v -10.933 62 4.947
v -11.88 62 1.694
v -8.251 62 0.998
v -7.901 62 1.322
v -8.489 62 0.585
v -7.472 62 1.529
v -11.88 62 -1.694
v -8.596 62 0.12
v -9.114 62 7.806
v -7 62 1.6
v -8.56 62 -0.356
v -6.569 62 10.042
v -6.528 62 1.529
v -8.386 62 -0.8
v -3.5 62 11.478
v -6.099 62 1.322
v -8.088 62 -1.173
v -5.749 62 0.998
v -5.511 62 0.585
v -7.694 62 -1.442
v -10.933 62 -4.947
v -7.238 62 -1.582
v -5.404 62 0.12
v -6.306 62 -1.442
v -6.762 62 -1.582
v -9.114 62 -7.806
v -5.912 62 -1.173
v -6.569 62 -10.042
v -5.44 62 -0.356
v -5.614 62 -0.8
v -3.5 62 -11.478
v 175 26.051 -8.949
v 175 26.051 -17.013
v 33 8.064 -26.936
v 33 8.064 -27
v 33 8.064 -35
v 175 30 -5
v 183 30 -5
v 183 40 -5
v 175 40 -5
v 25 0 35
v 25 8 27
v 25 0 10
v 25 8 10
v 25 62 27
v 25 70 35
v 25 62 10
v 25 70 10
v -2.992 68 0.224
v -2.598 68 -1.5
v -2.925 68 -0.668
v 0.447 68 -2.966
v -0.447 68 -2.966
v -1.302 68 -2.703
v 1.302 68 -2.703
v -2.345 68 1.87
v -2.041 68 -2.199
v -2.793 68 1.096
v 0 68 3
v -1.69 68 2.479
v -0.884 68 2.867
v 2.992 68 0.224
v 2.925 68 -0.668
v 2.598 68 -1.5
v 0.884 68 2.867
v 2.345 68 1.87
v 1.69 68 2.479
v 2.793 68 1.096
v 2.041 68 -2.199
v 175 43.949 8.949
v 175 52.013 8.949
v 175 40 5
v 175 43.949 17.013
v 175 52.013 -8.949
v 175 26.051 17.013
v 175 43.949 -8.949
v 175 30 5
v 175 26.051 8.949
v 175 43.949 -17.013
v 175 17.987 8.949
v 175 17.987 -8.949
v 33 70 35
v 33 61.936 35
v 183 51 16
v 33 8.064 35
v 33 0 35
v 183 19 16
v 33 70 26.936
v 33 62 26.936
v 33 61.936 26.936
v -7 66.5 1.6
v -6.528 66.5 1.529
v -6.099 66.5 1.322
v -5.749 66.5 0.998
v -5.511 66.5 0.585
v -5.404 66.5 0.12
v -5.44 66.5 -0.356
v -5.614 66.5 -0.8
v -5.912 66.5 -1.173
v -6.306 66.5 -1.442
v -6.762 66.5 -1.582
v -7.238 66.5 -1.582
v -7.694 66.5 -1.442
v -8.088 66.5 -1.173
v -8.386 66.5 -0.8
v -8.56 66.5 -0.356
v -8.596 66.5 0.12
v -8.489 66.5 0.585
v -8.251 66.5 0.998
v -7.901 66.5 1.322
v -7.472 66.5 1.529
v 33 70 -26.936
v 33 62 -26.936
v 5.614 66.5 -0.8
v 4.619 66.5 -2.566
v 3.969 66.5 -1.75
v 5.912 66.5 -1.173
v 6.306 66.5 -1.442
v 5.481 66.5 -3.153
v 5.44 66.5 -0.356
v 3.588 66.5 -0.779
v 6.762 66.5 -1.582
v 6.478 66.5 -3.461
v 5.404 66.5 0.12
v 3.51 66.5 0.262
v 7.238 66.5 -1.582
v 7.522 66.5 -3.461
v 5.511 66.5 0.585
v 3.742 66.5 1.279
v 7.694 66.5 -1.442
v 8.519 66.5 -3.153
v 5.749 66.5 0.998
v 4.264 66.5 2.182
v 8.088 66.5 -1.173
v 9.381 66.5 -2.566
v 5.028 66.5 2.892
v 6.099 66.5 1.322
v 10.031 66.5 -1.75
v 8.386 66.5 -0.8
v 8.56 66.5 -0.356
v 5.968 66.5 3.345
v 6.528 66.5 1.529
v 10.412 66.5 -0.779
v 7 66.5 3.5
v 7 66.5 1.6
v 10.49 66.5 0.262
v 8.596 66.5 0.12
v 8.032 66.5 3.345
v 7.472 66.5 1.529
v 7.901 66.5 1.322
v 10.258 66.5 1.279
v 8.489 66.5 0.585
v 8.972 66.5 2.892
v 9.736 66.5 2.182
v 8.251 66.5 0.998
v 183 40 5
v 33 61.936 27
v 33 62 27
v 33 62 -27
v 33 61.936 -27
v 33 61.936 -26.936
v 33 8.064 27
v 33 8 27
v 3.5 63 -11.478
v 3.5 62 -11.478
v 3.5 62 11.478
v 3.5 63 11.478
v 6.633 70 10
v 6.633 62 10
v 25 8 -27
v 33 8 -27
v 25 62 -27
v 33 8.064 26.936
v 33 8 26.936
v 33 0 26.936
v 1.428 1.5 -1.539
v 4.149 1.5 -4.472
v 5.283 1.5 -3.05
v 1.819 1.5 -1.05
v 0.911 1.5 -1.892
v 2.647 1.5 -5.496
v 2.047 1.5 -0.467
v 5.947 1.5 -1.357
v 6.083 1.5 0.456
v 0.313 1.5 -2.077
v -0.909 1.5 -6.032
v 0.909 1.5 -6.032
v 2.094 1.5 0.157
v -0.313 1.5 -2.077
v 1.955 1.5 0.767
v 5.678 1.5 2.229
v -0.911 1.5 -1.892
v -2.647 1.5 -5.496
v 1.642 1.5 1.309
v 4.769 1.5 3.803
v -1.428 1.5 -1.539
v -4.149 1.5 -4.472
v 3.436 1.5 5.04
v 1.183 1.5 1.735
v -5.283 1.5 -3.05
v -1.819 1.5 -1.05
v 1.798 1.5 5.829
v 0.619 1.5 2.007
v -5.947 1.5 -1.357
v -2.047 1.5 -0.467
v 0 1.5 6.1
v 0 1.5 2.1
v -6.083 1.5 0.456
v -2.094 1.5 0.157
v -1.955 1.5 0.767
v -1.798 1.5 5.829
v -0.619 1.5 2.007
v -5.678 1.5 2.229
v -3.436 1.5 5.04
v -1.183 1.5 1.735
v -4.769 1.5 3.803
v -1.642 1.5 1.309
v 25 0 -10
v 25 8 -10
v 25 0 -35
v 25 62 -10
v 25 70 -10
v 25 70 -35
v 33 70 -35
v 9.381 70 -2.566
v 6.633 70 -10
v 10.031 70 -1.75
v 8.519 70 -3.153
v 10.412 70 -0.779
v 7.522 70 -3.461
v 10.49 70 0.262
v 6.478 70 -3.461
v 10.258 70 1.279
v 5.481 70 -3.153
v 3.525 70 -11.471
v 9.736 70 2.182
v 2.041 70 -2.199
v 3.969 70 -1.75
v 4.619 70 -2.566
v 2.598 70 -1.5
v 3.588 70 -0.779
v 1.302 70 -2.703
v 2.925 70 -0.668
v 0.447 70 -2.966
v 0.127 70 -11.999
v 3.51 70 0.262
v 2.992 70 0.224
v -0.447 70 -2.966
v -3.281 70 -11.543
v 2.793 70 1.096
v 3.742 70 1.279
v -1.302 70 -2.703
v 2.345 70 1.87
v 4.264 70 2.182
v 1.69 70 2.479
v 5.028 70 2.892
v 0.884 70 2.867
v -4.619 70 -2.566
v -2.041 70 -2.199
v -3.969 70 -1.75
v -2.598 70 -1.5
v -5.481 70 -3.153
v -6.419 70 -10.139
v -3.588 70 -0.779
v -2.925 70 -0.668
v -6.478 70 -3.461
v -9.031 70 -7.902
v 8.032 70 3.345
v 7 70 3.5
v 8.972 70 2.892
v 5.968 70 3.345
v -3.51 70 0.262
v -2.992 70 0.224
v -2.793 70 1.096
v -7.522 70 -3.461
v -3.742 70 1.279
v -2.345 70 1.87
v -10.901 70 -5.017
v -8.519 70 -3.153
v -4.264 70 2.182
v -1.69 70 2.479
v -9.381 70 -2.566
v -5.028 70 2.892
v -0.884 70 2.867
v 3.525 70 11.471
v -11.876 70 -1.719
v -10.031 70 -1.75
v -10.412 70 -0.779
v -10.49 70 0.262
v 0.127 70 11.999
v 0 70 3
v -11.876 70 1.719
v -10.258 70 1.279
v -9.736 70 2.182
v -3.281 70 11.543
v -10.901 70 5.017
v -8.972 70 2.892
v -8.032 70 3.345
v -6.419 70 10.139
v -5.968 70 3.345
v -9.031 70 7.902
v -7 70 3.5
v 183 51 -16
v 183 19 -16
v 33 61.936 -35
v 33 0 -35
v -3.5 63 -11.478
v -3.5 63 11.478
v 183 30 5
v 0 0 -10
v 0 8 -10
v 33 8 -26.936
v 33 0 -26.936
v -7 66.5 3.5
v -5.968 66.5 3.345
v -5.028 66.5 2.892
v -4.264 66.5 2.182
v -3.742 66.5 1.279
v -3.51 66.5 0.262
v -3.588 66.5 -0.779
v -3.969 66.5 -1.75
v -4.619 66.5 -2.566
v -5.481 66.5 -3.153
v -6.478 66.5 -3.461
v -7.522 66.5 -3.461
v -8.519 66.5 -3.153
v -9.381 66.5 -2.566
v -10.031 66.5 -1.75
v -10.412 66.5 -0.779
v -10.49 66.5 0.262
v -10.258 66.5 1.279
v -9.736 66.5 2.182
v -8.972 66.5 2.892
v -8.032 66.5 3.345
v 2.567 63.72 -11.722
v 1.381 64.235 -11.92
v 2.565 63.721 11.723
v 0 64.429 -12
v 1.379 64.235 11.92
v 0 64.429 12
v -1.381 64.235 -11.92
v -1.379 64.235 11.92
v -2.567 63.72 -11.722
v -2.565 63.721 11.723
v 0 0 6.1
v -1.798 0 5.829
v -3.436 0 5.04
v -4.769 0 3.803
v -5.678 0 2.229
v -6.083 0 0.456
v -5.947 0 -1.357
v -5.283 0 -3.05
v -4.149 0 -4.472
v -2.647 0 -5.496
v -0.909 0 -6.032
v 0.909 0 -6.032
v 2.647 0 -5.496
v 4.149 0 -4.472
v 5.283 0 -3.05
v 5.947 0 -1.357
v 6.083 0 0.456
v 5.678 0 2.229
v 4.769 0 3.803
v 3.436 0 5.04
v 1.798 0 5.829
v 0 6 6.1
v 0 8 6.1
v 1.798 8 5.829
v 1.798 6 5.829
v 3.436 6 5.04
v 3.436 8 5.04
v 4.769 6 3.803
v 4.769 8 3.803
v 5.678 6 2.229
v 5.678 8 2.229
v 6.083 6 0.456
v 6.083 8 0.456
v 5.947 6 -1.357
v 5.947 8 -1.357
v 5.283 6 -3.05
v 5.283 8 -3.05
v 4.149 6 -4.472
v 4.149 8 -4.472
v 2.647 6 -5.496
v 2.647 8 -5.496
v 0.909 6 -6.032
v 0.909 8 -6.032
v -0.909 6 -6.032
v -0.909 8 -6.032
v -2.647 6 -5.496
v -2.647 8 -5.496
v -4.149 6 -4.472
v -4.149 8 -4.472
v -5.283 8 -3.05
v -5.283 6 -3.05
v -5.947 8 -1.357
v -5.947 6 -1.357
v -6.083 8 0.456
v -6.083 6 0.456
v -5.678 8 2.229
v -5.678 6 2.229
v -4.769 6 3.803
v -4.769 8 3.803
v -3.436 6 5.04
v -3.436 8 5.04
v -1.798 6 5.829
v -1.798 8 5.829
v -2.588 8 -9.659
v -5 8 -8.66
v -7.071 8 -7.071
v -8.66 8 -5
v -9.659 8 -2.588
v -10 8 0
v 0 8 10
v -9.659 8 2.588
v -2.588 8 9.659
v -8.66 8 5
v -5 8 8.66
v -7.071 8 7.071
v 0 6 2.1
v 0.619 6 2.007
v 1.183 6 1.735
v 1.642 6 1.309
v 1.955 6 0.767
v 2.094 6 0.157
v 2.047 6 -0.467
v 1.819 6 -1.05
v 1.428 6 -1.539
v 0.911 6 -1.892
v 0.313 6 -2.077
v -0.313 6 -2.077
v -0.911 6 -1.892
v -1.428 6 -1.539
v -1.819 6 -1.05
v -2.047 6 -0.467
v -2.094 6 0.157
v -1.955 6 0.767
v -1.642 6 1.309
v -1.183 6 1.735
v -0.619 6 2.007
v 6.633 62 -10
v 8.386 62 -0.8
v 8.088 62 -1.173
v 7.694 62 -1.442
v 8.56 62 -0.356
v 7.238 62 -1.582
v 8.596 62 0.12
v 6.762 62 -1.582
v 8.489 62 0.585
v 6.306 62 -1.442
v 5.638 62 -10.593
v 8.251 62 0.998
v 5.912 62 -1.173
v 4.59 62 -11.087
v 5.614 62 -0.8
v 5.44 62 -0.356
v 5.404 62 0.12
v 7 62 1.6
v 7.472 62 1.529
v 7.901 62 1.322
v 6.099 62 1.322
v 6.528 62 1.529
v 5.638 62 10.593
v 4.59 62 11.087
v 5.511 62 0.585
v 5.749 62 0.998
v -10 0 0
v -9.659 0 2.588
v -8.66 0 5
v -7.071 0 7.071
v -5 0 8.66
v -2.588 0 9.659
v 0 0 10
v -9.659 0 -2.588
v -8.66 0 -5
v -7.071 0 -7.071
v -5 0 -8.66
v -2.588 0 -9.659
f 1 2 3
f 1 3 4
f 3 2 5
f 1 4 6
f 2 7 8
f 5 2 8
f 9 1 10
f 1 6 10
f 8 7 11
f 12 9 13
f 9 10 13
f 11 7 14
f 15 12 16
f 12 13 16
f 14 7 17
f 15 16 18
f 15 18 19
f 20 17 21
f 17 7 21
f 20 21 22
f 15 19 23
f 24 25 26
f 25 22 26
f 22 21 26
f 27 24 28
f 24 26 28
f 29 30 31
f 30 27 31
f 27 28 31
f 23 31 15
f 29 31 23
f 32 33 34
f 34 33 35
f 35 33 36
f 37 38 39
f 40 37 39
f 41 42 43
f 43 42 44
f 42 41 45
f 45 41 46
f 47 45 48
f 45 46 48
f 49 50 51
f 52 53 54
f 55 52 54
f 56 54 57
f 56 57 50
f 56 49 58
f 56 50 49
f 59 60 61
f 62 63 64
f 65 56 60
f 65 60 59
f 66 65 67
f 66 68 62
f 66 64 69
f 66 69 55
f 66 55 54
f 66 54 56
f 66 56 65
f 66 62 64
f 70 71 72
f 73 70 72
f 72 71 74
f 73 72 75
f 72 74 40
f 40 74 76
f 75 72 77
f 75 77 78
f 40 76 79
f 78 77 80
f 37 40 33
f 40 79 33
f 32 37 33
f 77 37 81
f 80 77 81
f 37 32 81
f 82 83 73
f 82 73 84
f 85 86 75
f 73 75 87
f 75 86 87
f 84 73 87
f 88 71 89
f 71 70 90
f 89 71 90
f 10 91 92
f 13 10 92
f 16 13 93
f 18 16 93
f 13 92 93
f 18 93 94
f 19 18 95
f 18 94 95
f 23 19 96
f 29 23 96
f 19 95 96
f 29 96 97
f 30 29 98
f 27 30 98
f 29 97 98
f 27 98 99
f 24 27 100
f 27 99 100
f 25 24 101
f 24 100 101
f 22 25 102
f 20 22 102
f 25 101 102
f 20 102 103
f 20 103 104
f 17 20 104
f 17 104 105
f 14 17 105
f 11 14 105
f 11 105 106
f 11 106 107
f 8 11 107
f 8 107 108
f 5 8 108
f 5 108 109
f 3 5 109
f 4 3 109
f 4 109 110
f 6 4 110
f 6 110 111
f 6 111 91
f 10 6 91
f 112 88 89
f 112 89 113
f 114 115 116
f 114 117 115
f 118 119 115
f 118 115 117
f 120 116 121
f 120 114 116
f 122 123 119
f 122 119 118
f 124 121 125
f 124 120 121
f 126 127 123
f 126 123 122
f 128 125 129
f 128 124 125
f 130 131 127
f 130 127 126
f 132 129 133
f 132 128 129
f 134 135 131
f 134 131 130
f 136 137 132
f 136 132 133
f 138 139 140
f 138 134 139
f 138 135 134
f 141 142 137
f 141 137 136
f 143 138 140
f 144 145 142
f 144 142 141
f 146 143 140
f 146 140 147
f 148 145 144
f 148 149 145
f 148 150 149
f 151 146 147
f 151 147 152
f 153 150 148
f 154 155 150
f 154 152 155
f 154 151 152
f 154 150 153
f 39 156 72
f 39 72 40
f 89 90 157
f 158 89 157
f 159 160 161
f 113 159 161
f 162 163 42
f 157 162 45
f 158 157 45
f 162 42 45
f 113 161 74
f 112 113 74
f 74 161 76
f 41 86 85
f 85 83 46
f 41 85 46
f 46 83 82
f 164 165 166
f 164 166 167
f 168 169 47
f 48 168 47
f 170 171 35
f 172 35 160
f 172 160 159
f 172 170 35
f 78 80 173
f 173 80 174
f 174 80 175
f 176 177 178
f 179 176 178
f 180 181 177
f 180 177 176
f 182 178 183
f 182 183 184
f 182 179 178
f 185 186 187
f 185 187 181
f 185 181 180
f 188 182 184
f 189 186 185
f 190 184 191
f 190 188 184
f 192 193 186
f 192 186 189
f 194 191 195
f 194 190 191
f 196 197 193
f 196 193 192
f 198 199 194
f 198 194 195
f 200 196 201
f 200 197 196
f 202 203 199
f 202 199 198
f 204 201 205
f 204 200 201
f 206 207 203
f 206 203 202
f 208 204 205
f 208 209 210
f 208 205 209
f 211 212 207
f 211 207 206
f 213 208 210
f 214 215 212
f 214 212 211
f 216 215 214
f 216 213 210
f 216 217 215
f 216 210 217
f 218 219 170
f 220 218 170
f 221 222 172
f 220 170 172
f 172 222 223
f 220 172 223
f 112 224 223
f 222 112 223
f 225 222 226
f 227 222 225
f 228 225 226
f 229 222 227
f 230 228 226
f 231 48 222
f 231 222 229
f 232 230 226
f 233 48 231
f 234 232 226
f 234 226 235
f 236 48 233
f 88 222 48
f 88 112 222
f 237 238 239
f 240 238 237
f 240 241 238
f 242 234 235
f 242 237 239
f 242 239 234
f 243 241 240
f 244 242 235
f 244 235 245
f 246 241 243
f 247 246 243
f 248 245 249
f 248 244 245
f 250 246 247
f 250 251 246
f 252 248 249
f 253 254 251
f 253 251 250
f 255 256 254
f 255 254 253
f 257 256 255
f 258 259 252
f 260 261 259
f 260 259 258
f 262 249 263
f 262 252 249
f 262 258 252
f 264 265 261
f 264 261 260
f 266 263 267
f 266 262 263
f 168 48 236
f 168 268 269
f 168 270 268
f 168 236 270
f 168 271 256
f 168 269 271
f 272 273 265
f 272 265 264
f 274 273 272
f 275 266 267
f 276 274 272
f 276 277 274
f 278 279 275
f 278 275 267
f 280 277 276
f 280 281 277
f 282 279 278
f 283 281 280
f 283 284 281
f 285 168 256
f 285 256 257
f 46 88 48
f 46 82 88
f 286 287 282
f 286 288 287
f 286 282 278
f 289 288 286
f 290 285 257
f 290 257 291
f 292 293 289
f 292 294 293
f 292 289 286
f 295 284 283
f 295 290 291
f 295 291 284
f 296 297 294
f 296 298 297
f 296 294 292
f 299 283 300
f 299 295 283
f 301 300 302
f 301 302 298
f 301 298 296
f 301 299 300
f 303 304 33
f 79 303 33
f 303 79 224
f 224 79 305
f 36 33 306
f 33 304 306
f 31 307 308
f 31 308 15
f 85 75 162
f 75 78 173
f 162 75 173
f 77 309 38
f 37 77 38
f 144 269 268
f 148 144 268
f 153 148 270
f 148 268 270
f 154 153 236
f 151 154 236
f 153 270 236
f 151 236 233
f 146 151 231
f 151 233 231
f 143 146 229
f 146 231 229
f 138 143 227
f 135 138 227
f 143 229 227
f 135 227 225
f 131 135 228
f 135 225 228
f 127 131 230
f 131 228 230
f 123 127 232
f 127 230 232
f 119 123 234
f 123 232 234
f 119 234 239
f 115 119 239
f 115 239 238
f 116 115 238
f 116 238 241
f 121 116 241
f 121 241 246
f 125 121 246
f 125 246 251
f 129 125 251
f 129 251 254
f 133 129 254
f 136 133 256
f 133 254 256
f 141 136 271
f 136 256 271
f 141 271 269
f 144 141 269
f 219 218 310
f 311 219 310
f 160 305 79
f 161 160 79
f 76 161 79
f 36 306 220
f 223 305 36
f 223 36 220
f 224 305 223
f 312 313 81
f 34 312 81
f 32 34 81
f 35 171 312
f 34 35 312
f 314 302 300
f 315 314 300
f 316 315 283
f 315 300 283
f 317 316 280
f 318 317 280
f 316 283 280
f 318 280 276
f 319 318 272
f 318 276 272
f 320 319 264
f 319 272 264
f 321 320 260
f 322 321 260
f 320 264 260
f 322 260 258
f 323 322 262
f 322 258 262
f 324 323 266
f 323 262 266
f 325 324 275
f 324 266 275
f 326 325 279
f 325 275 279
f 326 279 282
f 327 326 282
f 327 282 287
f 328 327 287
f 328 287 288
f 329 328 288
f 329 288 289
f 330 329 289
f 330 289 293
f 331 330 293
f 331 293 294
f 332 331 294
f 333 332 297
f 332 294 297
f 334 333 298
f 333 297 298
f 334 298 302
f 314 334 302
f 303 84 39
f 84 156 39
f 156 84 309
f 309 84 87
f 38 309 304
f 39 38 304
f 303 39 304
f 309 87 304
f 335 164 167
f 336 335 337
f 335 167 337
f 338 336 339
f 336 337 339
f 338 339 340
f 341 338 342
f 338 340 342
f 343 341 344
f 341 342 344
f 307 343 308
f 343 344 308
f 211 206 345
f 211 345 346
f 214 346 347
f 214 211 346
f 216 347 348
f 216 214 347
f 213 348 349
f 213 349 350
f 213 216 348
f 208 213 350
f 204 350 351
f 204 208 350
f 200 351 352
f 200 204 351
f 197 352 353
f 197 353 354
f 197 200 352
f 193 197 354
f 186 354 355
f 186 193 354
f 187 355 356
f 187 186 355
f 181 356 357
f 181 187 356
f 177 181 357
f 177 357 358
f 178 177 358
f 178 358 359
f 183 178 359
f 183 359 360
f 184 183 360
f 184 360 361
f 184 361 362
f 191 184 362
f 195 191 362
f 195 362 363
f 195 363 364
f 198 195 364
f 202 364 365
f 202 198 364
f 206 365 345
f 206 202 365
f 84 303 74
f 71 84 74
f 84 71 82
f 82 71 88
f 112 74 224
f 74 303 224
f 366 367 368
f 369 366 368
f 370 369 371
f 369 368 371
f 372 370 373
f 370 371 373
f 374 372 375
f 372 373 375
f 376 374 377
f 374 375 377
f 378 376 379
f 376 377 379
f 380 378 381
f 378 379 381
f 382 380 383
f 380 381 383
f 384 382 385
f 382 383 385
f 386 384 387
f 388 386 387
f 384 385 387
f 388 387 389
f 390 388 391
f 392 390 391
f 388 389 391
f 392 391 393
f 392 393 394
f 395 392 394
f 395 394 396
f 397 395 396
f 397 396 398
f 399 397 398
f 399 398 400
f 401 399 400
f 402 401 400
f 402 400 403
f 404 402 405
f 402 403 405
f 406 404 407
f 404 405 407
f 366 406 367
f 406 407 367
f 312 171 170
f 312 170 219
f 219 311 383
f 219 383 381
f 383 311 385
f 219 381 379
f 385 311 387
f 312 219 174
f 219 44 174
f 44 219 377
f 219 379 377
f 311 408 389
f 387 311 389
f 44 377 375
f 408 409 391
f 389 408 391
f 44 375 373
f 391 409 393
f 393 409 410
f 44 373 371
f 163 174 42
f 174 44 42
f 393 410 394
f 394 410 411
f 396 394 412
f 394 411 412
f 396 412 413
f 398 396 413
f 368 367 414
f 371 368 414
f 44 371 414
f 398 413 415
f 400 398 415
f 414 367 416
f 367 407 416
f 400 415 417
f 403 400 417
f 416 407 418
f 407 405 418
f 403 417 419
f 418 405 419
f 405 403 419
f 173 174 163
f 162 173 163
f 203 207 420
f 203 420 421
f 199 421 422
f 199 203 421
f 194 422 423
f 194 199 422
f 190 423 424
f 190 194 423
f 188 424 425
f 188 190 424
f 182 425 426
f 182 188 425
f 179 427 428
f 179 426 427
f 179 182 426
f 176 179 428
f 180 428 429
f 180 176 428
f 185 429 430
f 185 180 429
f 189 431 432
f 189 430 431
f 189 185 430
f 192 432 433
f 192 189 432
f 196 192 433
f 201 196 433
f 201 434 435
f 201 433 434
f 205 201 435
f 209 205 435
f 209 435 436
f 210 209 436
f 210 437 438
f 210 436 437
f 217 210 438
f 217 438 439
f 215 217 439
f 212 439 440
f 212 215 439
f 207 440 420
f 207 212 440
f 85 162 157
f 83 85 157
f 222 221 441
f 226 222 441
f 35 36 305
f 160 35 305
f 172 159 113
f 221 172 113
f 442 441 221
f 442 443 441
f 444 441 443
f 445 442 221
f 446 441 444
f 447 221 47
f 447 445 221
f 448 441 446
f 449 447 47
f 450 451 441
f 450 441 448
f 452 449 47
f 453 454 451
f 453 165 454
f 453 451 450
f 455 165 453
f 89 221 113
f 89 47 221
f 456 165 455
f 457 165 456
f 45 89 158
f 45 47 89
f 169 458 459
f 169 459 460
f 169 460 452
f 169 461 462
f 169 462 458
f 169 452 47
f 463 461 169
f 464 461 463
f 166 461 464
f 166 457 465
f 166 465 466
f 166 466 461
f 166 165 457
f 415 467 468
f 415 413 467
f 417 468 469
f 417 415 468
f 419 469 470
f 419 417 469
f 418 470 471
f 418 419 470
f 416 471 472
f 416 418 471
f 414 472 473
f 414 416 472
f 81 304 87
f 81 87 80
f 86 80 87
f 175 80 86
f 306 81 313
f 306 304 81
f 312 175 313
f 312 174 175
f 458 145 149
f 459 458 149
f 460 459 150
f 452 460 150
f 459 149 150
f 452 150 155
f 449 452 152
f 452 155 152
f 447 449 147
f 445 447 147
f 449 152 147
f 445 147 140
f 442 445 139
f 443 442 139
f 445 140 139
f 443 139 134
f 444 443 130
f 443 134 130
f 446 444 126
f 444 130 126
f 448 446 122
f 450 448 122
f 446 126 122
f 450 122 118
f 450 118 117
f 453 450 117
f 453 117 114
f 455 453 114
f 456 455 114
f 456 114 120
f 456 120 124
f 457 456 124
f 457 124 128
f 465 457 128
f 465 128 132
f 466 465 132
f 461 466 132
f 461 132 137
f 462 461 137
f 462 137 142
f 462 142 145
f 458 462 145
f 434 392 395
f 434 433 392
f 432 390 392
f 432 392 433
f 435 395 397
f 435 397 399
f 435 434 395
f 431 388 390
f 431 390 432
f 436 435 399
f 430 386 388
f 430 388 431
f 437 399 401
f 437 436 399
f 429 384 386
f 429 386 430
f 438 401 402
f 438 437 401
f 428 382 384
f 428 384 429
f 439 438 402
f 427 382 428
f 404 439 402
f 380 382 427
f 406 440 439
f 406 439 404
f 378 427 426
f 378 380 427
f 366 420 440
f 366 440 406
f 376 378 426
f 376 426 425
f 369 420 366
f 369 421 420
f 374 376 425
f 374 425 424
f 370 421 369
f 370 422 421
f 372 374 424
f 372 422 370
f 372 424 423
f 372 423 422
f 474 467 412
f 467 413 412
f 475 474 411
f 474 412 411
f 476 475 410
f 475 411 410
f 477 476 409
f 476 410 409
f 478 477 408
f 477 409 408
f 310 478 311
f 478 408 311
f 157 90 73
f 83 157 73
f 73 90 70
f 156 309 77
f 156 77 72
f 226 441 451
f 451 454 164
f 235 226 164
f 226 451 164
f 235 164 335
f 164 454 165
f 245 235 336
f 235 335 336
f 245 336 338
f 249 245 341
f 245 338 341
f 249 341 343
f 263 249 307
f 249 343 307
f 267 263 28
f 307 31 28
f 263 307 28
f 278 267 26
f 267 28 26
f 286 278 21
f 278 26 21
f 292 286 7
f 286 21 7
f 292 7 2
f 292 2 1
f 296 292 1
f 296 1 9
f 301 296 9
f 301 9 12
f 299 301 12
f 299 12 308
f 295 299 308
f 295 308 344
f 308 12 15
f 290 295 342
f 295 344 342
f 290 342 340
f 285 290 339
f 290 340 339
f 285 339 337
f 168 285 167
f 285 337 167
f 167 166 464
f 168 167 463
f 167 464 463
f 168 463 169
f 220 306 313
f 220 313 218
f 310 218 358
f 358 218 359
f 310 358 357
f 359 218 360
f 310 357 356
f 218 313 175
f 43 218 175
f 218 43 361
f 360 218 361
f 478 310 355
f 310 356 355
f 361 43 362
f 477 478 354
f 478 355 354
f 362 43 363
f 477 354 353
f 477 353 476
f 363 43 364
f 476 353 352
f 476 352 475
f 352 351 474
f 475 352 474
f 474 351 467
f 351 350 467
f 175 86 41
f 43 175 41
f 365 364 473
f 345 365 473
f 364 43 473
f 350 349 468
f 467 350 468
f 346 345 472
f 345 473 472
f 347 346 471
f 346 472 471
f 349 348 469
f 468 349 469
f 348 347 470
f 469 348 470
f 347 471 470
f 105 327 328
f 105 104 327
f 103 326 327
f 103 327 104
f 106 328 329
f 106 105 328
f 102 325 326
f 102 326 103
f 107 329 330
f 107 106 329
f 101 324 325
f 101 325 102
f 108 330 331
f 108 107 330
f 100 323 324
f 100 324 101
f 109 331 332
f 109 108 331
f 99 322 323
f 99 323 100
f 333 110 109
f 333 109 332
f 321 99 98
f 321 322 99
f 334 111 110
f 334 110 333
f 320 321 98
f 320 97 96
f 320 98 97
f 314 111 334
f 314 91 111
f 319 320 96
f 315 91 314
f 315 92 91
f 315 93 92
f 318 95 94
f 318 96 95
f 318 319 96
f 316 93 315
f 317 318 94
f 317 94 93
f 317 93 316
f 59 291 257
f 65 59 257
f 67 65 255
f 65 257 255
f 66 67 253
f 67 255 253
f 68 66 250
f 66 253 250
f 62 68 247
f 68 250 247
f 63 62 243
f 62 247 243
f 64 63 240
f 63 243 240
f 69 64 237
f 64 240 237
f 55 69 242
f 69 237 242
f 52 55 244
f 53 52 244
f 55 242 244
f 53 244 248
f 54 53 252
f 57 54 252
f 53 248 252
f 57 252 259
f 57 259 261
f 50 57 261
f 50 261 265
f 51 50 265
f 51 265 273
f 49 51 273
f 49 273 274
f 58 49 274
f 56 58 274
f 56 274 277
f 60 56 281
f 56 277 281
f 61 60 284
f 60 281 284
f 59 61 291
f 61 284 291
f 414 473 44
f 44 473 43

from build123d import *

# Parameters (mm, degrees)
SZKIC1_W                        = 43
SZKIC1_H                        = 20
SZKIC1_R                        = 2.1
DODANIE_WYCI_GNI_CIE1_DEPTH     = 8
SZKIC2_R                        = 6.1
WYTNIJ_WYCI_GNI_CIE1_DEPTH      = 2
WYTNIJ_WYCI_GNI_CIE2_START      = -1.5
SZKIC3_R                        = 6.1
WYTNIJ_WYCI_GNI_CIE2_DEPTH      = 1.5
SZKIC4_W                        = 8
SZKIC4_H                        = 20
DODANIE_WYCI_GNI_CIE2_DEPTH     = 54
ZAOKR_GLENIE1_R                 = 10
DODANIE_WYCI_GNI_CIE3_DEPTH     = 8
WYTNIJ_WYCI_GNI_CIE3_REACH      = 80.313
SZKIC6_R                        = 1.6
SZKIC7_R                        = 3.5
WYTNIJ_WYCI_GNI_CIE4_DEPTH      = 3.5
WYTNIJ_WYCI_GNI_CIE5_REACH      = 83.025
WYTNIJ_WYCI_GNI_CIE5_END_RADIUS = 12
SZKIC10_R                       = 3
WYTNIJ_WYCI_GNI_CIE6_DEPTH      = 2
SZKIC13_W                       = 25
SZKIC13_H                       = 70
DODANIE_WYCI_GNI_CIE4_DEPTH     = 8
WYTNIJ_WYCI_GNI_CIE7_REACH      = 88.568
SZKIC14_W                       = 54
SZKIC14_H                       = 54
DODANIE_WYCI_GNI_CIE5_DEPTH     = 70
WYTNIJ_WYCI_GNI_CIE9_DEPTH      = 209.060087508
WYTNIJ_WYCI_GNI_CIE10_REACH     = 212.119
SZKIC20_W                       = 10
SZKIC20_H                       = 10


with BuildPart() as part:
    # Szkic1 → Dodanie-wyciągnięcie1 (new body)
    with BuildSketch(Plane(origin=(0, 0, 0), x_dir=(1, 0, 0), z_dir=(0, 1, 0))):
        with Locations((11.5, 0)):
            Rectangle(SZKIC1_W, SZKIC1_H)
        with Locations(Location((0, 0, 0), (0, 0, 270))):
            Circle(SZKIC1_R, mode=Mode.SUBTRACT)
    extrude(amount=DODANIE_WYCI_GNI_CIE1_DEPTH)

    # Szkic2 → Wytnij-wyciągnięcie1 (cut)
    with BuildSketch(Plane(origin=(0, 8, 0), x_dir=(1, 0, 0), z_dir=(0, 1, 0))):
        with Locations(Location((0, 0, 0), (0, 0, 270))):
            Circle(SZKIC2_R)
    extrude(amount=-WYTNIJ_WYCI_GNI_CIE1_DEPTH, mode=Mode.SUBTRACT)

    # Szkic3 → Wytnij-wyciągnięcie2 (cut)
    with BuildSketch(Plane.XZ.offset(WYTNIJ_WYCI_GNI_CIE2_START)):
        with Locations(Location((0, 0, 0), (0, 0, 90))):
            Circle(SZKIC3_R)
    extrude(amount=WYTNIJ_WYCI_GNI_CIE2_DEPTH, mode=Mode.SUBTRACT)

    # Szkic4 → Dodanie-wyciągnięcie2 (add)
    with BuildSketch(Plane(origin=(0, 8, 0), x_dir=(1, 0, 0), z_dir=(0, 1, 0))):
        with Locations((29, 0)):
            Rectangle(SZKIC4_W, SZKIC4_H)
    extrude(amount=DODANIE_WYCI_GNI_CIE2_DEPTH)

    # Zaokrąglenie1
    zaokr_glenie1_edges = [part.edges().sort_by_distance(p)[0] for p in [
        (-10, 4, -10),
        (-10, 4, 10),
    ]]
    fillet(zaokr_glenie1_edges, radius=ZAOKR_GLENIE1_R - 0.0001)  # a hair under: the kernel refuses the full size

    # Szkic5 → Dodanie-wyciągnięcie3 (add)
    with BuildSketch(Plane(origin=(0, 62, 0), x_dir=(1, 0, 0), z_dir=(0, 1, 0))):
        with BuildLine():
            Line((33, -10), (33, 10))
            Line((33, 10), (6.633249581, 10))
            ThreePointArc((6.633249581, 10), (-12, 0), (6.633249581, -10))
            Line((6.633249581, -10), (33, -10))
        make_face()
    extrude(amount=DODANIE_WYCI_GNI_CIE3_DEPTH)

    # Szkic6 → Wytnij-wyciągnięcie3 (cut, up to next)
    with BuildSketch(Plane(origin=(0, 70, 0), x_dir=(1, 0, 0), z_dir=(0, 1, 0)), mode=Mode.PRIVATE) as wytnij_wyci_gni_cie3_sk1:
        with Locations(Location((-7, 0, 0), (0, 0, 270))):
            Circle(SZKIC6_R)
    wytnij_wyci_gni_cie3_tool1 = extrude(wytnij_wyci_gni_cie3_sk1.sketch, amount=-WYTNIJ_WYCI_GNI_CIE3_REACH, mode=Mode.PRIVATE) & part.part
    # Szkic6 → Wytnij-wyciągnięcie3 (cut, up to next)
    with BuildSketch(Plane(origin=(0, 70, 0), x_dir=(1, 0, 0), z_dir=(0, 1, 0)), mode=Mode.PRIVATE) as wytnij_wyci_gni_cie3_sk2:
        with Locations(Location((7, 0, 0), (0, 0, 270))):
            Circle(SZKIC6_R)
    wytnij_wyci_gni_cie3_tool2 = extrude(wytnij_wyci_gni_cie3_sk2.sketch, amount=-WYTNIJ_WYCI_GNI_CIE3_REACH, mode=Mode.PRIVATE) & part.part
    add(wytnij_wyci_gni_cie3_tool1.solids().sort_by_distance((-7, 70, 0))[0], mode=Mode.SUBTRACT)
    add(wytnij_wyci_gni_cie3_tool2.solids().sort_by_distance((7, 70, 0))[0], mode=Mode.SUBTRACT)

    # Szkic7 → Wytnij-wyciągnięcie4 (cut)
    with BuildSketch(Plane(origin=(0, 70, 0), x_dir=(1, 0, 0), z_dir=(0, 1, 0))):
        with Locations(Location((7, 0, 0), (0, 0, 270))):
            Circle(SZKIC7_R)
        with Locations(Location((-7, 0, 0), (0, 0, 270))):
            Circle(SZKIC7_R)
    extrude(amount=-WYTNIJ_WYCI_GNI_CIE4_DEPTH, mode=Mode.SUBTRACT)

    # Wytnij-wyciągnięcie5: up to this cylinder (the profile starts inside it)
    wytnij_wyci_gni_cie5_end = Plane(origin=(0, 63.035303, 0), z_dir=(0, -1, 0)) * Cylinder(WYTNIJ_WYCI_GNI_CIE5_END_RADIUS, 191.05, mode=Mode.PRIVATE)
    # Szkic9 → Wytnij-wyciągnięcie5 (cut, up to the surface)
    with BuildSketch(Plane.XY.offset(12), mode=Mode.PRIVATE) as wytnij_wyci_gni_cie5_sk1:
        with BuildLine():
            Line((-3.5, 62), (3.5, 62))
            Line((3.5, 62), (3.5, 63))
            ThreePointArc((3.5, 63), (0, 64.429285786), (-3.5, 63))
            Line((-3.5, 63), (-3.5, 62))
        make_face()
    wytnij_wyci_gni_cie5_tool1 = extrude(wytnij_wyci_gni_cie5_sk1.sketch, amount=-WYTNIJ_WYCI_GNI_CIE5_REACH, mode=Mode.PRIVATE) & wytnij_wyci_gni_cie5_end
    add(wytnij_wyci_gni_cie5_tool1.solids().sort_by_distance((0, 63.035303, 12))[0], mode=Mode.SUBTRACT)

    # Szkic10 → Wytnij-wyciągnięcie6 (cut)
    with BuildSketch(Plane(origin=(0, 70, 0), x_dir=(1, 0, 0), z_dir=(0, 1, 0))):
        with Locations(Location((0, 0, 0), (0, 0, 270))):
            Circle(SZKIC10_R)
    extrude(amount=-WYTNIJ_WYCI_GNI_CIE6_DEPTH, mode=Mode.SUBTRACT)

    # Szkic13 → Dodanie-wyciągnięcie4 (add)
    with BuildSketch(Plane(origin=(33, 0, 0), x_dir=(0, 0, -1), z_dir=(1, 0, 0))):
        with Locations((22.5, 35)):
            Rectangle(SZKIC13_W, SZKIC13_H)
        with Locations((-22.5, 35)):
            Rectangle(SZKIC13_W, SZKIC13_H)
    extrude(amount=-DODANIE_WYCI_GNI_CIE4_DEPTH)

    # Szkic14 → Wytnij-wyciągnięcie7 (cut, up to next)
    with BuildSketch(Plane.ZY.offset(-25), mode=Mode.PRIVATE) as wytnij_wyci_gni_cie7_sk1:
        with Locations((0, 35)):
            Rectangle(SZKIC14_W, SZKIC14_H)
    wytnij_wyci_gni_cie7_tool1 = extrude(wytnij_wyci_gni_cie7_sk1.sketch, amount=-WYTNIJ_WYCI_GNI_CIE7_REACH, mode=Mode.PRIVATE) & part.part
    add(wytnij_wyci_gni_cie7_tool1.solids().sort_by_distance((25, 35, 0))[0], mode=Mode.SUBTRACT)

    # Szkic17 → Dodanie-wyciągnięcie5 (add, through all)
    with BuildSketch(Plane.XZ):
        Polygon((33, 35), (183, 16), (183, -16), (33, -35), (33, -26.936077602), (175, -8.949410935), (175, 8.949410935), (33, 26.936077602), align=None)
    extrude(amount=-DODANIE_WYCI_GNI_CIE5_DEPTH)

    # Szkic18 → Wytnij-wyciągnięcie9 (cut, through all)
    with BuildSketch(Plane(origin=(0, 0, -35), x_dir=(-1, 0, 0), z_dir=(0, 0, -1))):
        Polygon((-33, 70), (-183, 70), (-183, 51), align=None)
        Polygon((-183, 0), (-183, 19), (-33, 0), align=None)
        Polygon((-33, 8.063922398), (-33, 61.936077602), (-175, 43.949410935), (-175, 26.050589065), align=None)
    extrude(amount=-WYTNIJ_WYCI_GNI_CIE9_DEPTH, mode=Mode.SUBTRACT)

    # Szkic20 → Wytnij-wyciągnięcie10 (cut, up to next)
    with BuildSketch(Plane(origin=(183, 0, 0), x_dir=(0, 0, -1), z_dir=(1, 0, 0)), mode=Mode.PRIVATE) as wytnij_wyci_gni_cie10_sk1:
        with Locations((0, 35)):
            Rectangle(SZKIC20_W, SZKIC20_H)
    wytnij_wyci_gni_cie10_tool1 = extrude(wytnij_wyci_gni_cie10_sk1.sketch, amount=-WYTNIJ_WYCI_GNI_CIE10_REACH, mode=Mode.PRIVATE) & part.part
    add(wytnij_wyci_gni_cie10_tool1.solids().sort_by_distance((183, 35, 0))[0], mode=Mode.SUBTRACT)


solid = part.part
